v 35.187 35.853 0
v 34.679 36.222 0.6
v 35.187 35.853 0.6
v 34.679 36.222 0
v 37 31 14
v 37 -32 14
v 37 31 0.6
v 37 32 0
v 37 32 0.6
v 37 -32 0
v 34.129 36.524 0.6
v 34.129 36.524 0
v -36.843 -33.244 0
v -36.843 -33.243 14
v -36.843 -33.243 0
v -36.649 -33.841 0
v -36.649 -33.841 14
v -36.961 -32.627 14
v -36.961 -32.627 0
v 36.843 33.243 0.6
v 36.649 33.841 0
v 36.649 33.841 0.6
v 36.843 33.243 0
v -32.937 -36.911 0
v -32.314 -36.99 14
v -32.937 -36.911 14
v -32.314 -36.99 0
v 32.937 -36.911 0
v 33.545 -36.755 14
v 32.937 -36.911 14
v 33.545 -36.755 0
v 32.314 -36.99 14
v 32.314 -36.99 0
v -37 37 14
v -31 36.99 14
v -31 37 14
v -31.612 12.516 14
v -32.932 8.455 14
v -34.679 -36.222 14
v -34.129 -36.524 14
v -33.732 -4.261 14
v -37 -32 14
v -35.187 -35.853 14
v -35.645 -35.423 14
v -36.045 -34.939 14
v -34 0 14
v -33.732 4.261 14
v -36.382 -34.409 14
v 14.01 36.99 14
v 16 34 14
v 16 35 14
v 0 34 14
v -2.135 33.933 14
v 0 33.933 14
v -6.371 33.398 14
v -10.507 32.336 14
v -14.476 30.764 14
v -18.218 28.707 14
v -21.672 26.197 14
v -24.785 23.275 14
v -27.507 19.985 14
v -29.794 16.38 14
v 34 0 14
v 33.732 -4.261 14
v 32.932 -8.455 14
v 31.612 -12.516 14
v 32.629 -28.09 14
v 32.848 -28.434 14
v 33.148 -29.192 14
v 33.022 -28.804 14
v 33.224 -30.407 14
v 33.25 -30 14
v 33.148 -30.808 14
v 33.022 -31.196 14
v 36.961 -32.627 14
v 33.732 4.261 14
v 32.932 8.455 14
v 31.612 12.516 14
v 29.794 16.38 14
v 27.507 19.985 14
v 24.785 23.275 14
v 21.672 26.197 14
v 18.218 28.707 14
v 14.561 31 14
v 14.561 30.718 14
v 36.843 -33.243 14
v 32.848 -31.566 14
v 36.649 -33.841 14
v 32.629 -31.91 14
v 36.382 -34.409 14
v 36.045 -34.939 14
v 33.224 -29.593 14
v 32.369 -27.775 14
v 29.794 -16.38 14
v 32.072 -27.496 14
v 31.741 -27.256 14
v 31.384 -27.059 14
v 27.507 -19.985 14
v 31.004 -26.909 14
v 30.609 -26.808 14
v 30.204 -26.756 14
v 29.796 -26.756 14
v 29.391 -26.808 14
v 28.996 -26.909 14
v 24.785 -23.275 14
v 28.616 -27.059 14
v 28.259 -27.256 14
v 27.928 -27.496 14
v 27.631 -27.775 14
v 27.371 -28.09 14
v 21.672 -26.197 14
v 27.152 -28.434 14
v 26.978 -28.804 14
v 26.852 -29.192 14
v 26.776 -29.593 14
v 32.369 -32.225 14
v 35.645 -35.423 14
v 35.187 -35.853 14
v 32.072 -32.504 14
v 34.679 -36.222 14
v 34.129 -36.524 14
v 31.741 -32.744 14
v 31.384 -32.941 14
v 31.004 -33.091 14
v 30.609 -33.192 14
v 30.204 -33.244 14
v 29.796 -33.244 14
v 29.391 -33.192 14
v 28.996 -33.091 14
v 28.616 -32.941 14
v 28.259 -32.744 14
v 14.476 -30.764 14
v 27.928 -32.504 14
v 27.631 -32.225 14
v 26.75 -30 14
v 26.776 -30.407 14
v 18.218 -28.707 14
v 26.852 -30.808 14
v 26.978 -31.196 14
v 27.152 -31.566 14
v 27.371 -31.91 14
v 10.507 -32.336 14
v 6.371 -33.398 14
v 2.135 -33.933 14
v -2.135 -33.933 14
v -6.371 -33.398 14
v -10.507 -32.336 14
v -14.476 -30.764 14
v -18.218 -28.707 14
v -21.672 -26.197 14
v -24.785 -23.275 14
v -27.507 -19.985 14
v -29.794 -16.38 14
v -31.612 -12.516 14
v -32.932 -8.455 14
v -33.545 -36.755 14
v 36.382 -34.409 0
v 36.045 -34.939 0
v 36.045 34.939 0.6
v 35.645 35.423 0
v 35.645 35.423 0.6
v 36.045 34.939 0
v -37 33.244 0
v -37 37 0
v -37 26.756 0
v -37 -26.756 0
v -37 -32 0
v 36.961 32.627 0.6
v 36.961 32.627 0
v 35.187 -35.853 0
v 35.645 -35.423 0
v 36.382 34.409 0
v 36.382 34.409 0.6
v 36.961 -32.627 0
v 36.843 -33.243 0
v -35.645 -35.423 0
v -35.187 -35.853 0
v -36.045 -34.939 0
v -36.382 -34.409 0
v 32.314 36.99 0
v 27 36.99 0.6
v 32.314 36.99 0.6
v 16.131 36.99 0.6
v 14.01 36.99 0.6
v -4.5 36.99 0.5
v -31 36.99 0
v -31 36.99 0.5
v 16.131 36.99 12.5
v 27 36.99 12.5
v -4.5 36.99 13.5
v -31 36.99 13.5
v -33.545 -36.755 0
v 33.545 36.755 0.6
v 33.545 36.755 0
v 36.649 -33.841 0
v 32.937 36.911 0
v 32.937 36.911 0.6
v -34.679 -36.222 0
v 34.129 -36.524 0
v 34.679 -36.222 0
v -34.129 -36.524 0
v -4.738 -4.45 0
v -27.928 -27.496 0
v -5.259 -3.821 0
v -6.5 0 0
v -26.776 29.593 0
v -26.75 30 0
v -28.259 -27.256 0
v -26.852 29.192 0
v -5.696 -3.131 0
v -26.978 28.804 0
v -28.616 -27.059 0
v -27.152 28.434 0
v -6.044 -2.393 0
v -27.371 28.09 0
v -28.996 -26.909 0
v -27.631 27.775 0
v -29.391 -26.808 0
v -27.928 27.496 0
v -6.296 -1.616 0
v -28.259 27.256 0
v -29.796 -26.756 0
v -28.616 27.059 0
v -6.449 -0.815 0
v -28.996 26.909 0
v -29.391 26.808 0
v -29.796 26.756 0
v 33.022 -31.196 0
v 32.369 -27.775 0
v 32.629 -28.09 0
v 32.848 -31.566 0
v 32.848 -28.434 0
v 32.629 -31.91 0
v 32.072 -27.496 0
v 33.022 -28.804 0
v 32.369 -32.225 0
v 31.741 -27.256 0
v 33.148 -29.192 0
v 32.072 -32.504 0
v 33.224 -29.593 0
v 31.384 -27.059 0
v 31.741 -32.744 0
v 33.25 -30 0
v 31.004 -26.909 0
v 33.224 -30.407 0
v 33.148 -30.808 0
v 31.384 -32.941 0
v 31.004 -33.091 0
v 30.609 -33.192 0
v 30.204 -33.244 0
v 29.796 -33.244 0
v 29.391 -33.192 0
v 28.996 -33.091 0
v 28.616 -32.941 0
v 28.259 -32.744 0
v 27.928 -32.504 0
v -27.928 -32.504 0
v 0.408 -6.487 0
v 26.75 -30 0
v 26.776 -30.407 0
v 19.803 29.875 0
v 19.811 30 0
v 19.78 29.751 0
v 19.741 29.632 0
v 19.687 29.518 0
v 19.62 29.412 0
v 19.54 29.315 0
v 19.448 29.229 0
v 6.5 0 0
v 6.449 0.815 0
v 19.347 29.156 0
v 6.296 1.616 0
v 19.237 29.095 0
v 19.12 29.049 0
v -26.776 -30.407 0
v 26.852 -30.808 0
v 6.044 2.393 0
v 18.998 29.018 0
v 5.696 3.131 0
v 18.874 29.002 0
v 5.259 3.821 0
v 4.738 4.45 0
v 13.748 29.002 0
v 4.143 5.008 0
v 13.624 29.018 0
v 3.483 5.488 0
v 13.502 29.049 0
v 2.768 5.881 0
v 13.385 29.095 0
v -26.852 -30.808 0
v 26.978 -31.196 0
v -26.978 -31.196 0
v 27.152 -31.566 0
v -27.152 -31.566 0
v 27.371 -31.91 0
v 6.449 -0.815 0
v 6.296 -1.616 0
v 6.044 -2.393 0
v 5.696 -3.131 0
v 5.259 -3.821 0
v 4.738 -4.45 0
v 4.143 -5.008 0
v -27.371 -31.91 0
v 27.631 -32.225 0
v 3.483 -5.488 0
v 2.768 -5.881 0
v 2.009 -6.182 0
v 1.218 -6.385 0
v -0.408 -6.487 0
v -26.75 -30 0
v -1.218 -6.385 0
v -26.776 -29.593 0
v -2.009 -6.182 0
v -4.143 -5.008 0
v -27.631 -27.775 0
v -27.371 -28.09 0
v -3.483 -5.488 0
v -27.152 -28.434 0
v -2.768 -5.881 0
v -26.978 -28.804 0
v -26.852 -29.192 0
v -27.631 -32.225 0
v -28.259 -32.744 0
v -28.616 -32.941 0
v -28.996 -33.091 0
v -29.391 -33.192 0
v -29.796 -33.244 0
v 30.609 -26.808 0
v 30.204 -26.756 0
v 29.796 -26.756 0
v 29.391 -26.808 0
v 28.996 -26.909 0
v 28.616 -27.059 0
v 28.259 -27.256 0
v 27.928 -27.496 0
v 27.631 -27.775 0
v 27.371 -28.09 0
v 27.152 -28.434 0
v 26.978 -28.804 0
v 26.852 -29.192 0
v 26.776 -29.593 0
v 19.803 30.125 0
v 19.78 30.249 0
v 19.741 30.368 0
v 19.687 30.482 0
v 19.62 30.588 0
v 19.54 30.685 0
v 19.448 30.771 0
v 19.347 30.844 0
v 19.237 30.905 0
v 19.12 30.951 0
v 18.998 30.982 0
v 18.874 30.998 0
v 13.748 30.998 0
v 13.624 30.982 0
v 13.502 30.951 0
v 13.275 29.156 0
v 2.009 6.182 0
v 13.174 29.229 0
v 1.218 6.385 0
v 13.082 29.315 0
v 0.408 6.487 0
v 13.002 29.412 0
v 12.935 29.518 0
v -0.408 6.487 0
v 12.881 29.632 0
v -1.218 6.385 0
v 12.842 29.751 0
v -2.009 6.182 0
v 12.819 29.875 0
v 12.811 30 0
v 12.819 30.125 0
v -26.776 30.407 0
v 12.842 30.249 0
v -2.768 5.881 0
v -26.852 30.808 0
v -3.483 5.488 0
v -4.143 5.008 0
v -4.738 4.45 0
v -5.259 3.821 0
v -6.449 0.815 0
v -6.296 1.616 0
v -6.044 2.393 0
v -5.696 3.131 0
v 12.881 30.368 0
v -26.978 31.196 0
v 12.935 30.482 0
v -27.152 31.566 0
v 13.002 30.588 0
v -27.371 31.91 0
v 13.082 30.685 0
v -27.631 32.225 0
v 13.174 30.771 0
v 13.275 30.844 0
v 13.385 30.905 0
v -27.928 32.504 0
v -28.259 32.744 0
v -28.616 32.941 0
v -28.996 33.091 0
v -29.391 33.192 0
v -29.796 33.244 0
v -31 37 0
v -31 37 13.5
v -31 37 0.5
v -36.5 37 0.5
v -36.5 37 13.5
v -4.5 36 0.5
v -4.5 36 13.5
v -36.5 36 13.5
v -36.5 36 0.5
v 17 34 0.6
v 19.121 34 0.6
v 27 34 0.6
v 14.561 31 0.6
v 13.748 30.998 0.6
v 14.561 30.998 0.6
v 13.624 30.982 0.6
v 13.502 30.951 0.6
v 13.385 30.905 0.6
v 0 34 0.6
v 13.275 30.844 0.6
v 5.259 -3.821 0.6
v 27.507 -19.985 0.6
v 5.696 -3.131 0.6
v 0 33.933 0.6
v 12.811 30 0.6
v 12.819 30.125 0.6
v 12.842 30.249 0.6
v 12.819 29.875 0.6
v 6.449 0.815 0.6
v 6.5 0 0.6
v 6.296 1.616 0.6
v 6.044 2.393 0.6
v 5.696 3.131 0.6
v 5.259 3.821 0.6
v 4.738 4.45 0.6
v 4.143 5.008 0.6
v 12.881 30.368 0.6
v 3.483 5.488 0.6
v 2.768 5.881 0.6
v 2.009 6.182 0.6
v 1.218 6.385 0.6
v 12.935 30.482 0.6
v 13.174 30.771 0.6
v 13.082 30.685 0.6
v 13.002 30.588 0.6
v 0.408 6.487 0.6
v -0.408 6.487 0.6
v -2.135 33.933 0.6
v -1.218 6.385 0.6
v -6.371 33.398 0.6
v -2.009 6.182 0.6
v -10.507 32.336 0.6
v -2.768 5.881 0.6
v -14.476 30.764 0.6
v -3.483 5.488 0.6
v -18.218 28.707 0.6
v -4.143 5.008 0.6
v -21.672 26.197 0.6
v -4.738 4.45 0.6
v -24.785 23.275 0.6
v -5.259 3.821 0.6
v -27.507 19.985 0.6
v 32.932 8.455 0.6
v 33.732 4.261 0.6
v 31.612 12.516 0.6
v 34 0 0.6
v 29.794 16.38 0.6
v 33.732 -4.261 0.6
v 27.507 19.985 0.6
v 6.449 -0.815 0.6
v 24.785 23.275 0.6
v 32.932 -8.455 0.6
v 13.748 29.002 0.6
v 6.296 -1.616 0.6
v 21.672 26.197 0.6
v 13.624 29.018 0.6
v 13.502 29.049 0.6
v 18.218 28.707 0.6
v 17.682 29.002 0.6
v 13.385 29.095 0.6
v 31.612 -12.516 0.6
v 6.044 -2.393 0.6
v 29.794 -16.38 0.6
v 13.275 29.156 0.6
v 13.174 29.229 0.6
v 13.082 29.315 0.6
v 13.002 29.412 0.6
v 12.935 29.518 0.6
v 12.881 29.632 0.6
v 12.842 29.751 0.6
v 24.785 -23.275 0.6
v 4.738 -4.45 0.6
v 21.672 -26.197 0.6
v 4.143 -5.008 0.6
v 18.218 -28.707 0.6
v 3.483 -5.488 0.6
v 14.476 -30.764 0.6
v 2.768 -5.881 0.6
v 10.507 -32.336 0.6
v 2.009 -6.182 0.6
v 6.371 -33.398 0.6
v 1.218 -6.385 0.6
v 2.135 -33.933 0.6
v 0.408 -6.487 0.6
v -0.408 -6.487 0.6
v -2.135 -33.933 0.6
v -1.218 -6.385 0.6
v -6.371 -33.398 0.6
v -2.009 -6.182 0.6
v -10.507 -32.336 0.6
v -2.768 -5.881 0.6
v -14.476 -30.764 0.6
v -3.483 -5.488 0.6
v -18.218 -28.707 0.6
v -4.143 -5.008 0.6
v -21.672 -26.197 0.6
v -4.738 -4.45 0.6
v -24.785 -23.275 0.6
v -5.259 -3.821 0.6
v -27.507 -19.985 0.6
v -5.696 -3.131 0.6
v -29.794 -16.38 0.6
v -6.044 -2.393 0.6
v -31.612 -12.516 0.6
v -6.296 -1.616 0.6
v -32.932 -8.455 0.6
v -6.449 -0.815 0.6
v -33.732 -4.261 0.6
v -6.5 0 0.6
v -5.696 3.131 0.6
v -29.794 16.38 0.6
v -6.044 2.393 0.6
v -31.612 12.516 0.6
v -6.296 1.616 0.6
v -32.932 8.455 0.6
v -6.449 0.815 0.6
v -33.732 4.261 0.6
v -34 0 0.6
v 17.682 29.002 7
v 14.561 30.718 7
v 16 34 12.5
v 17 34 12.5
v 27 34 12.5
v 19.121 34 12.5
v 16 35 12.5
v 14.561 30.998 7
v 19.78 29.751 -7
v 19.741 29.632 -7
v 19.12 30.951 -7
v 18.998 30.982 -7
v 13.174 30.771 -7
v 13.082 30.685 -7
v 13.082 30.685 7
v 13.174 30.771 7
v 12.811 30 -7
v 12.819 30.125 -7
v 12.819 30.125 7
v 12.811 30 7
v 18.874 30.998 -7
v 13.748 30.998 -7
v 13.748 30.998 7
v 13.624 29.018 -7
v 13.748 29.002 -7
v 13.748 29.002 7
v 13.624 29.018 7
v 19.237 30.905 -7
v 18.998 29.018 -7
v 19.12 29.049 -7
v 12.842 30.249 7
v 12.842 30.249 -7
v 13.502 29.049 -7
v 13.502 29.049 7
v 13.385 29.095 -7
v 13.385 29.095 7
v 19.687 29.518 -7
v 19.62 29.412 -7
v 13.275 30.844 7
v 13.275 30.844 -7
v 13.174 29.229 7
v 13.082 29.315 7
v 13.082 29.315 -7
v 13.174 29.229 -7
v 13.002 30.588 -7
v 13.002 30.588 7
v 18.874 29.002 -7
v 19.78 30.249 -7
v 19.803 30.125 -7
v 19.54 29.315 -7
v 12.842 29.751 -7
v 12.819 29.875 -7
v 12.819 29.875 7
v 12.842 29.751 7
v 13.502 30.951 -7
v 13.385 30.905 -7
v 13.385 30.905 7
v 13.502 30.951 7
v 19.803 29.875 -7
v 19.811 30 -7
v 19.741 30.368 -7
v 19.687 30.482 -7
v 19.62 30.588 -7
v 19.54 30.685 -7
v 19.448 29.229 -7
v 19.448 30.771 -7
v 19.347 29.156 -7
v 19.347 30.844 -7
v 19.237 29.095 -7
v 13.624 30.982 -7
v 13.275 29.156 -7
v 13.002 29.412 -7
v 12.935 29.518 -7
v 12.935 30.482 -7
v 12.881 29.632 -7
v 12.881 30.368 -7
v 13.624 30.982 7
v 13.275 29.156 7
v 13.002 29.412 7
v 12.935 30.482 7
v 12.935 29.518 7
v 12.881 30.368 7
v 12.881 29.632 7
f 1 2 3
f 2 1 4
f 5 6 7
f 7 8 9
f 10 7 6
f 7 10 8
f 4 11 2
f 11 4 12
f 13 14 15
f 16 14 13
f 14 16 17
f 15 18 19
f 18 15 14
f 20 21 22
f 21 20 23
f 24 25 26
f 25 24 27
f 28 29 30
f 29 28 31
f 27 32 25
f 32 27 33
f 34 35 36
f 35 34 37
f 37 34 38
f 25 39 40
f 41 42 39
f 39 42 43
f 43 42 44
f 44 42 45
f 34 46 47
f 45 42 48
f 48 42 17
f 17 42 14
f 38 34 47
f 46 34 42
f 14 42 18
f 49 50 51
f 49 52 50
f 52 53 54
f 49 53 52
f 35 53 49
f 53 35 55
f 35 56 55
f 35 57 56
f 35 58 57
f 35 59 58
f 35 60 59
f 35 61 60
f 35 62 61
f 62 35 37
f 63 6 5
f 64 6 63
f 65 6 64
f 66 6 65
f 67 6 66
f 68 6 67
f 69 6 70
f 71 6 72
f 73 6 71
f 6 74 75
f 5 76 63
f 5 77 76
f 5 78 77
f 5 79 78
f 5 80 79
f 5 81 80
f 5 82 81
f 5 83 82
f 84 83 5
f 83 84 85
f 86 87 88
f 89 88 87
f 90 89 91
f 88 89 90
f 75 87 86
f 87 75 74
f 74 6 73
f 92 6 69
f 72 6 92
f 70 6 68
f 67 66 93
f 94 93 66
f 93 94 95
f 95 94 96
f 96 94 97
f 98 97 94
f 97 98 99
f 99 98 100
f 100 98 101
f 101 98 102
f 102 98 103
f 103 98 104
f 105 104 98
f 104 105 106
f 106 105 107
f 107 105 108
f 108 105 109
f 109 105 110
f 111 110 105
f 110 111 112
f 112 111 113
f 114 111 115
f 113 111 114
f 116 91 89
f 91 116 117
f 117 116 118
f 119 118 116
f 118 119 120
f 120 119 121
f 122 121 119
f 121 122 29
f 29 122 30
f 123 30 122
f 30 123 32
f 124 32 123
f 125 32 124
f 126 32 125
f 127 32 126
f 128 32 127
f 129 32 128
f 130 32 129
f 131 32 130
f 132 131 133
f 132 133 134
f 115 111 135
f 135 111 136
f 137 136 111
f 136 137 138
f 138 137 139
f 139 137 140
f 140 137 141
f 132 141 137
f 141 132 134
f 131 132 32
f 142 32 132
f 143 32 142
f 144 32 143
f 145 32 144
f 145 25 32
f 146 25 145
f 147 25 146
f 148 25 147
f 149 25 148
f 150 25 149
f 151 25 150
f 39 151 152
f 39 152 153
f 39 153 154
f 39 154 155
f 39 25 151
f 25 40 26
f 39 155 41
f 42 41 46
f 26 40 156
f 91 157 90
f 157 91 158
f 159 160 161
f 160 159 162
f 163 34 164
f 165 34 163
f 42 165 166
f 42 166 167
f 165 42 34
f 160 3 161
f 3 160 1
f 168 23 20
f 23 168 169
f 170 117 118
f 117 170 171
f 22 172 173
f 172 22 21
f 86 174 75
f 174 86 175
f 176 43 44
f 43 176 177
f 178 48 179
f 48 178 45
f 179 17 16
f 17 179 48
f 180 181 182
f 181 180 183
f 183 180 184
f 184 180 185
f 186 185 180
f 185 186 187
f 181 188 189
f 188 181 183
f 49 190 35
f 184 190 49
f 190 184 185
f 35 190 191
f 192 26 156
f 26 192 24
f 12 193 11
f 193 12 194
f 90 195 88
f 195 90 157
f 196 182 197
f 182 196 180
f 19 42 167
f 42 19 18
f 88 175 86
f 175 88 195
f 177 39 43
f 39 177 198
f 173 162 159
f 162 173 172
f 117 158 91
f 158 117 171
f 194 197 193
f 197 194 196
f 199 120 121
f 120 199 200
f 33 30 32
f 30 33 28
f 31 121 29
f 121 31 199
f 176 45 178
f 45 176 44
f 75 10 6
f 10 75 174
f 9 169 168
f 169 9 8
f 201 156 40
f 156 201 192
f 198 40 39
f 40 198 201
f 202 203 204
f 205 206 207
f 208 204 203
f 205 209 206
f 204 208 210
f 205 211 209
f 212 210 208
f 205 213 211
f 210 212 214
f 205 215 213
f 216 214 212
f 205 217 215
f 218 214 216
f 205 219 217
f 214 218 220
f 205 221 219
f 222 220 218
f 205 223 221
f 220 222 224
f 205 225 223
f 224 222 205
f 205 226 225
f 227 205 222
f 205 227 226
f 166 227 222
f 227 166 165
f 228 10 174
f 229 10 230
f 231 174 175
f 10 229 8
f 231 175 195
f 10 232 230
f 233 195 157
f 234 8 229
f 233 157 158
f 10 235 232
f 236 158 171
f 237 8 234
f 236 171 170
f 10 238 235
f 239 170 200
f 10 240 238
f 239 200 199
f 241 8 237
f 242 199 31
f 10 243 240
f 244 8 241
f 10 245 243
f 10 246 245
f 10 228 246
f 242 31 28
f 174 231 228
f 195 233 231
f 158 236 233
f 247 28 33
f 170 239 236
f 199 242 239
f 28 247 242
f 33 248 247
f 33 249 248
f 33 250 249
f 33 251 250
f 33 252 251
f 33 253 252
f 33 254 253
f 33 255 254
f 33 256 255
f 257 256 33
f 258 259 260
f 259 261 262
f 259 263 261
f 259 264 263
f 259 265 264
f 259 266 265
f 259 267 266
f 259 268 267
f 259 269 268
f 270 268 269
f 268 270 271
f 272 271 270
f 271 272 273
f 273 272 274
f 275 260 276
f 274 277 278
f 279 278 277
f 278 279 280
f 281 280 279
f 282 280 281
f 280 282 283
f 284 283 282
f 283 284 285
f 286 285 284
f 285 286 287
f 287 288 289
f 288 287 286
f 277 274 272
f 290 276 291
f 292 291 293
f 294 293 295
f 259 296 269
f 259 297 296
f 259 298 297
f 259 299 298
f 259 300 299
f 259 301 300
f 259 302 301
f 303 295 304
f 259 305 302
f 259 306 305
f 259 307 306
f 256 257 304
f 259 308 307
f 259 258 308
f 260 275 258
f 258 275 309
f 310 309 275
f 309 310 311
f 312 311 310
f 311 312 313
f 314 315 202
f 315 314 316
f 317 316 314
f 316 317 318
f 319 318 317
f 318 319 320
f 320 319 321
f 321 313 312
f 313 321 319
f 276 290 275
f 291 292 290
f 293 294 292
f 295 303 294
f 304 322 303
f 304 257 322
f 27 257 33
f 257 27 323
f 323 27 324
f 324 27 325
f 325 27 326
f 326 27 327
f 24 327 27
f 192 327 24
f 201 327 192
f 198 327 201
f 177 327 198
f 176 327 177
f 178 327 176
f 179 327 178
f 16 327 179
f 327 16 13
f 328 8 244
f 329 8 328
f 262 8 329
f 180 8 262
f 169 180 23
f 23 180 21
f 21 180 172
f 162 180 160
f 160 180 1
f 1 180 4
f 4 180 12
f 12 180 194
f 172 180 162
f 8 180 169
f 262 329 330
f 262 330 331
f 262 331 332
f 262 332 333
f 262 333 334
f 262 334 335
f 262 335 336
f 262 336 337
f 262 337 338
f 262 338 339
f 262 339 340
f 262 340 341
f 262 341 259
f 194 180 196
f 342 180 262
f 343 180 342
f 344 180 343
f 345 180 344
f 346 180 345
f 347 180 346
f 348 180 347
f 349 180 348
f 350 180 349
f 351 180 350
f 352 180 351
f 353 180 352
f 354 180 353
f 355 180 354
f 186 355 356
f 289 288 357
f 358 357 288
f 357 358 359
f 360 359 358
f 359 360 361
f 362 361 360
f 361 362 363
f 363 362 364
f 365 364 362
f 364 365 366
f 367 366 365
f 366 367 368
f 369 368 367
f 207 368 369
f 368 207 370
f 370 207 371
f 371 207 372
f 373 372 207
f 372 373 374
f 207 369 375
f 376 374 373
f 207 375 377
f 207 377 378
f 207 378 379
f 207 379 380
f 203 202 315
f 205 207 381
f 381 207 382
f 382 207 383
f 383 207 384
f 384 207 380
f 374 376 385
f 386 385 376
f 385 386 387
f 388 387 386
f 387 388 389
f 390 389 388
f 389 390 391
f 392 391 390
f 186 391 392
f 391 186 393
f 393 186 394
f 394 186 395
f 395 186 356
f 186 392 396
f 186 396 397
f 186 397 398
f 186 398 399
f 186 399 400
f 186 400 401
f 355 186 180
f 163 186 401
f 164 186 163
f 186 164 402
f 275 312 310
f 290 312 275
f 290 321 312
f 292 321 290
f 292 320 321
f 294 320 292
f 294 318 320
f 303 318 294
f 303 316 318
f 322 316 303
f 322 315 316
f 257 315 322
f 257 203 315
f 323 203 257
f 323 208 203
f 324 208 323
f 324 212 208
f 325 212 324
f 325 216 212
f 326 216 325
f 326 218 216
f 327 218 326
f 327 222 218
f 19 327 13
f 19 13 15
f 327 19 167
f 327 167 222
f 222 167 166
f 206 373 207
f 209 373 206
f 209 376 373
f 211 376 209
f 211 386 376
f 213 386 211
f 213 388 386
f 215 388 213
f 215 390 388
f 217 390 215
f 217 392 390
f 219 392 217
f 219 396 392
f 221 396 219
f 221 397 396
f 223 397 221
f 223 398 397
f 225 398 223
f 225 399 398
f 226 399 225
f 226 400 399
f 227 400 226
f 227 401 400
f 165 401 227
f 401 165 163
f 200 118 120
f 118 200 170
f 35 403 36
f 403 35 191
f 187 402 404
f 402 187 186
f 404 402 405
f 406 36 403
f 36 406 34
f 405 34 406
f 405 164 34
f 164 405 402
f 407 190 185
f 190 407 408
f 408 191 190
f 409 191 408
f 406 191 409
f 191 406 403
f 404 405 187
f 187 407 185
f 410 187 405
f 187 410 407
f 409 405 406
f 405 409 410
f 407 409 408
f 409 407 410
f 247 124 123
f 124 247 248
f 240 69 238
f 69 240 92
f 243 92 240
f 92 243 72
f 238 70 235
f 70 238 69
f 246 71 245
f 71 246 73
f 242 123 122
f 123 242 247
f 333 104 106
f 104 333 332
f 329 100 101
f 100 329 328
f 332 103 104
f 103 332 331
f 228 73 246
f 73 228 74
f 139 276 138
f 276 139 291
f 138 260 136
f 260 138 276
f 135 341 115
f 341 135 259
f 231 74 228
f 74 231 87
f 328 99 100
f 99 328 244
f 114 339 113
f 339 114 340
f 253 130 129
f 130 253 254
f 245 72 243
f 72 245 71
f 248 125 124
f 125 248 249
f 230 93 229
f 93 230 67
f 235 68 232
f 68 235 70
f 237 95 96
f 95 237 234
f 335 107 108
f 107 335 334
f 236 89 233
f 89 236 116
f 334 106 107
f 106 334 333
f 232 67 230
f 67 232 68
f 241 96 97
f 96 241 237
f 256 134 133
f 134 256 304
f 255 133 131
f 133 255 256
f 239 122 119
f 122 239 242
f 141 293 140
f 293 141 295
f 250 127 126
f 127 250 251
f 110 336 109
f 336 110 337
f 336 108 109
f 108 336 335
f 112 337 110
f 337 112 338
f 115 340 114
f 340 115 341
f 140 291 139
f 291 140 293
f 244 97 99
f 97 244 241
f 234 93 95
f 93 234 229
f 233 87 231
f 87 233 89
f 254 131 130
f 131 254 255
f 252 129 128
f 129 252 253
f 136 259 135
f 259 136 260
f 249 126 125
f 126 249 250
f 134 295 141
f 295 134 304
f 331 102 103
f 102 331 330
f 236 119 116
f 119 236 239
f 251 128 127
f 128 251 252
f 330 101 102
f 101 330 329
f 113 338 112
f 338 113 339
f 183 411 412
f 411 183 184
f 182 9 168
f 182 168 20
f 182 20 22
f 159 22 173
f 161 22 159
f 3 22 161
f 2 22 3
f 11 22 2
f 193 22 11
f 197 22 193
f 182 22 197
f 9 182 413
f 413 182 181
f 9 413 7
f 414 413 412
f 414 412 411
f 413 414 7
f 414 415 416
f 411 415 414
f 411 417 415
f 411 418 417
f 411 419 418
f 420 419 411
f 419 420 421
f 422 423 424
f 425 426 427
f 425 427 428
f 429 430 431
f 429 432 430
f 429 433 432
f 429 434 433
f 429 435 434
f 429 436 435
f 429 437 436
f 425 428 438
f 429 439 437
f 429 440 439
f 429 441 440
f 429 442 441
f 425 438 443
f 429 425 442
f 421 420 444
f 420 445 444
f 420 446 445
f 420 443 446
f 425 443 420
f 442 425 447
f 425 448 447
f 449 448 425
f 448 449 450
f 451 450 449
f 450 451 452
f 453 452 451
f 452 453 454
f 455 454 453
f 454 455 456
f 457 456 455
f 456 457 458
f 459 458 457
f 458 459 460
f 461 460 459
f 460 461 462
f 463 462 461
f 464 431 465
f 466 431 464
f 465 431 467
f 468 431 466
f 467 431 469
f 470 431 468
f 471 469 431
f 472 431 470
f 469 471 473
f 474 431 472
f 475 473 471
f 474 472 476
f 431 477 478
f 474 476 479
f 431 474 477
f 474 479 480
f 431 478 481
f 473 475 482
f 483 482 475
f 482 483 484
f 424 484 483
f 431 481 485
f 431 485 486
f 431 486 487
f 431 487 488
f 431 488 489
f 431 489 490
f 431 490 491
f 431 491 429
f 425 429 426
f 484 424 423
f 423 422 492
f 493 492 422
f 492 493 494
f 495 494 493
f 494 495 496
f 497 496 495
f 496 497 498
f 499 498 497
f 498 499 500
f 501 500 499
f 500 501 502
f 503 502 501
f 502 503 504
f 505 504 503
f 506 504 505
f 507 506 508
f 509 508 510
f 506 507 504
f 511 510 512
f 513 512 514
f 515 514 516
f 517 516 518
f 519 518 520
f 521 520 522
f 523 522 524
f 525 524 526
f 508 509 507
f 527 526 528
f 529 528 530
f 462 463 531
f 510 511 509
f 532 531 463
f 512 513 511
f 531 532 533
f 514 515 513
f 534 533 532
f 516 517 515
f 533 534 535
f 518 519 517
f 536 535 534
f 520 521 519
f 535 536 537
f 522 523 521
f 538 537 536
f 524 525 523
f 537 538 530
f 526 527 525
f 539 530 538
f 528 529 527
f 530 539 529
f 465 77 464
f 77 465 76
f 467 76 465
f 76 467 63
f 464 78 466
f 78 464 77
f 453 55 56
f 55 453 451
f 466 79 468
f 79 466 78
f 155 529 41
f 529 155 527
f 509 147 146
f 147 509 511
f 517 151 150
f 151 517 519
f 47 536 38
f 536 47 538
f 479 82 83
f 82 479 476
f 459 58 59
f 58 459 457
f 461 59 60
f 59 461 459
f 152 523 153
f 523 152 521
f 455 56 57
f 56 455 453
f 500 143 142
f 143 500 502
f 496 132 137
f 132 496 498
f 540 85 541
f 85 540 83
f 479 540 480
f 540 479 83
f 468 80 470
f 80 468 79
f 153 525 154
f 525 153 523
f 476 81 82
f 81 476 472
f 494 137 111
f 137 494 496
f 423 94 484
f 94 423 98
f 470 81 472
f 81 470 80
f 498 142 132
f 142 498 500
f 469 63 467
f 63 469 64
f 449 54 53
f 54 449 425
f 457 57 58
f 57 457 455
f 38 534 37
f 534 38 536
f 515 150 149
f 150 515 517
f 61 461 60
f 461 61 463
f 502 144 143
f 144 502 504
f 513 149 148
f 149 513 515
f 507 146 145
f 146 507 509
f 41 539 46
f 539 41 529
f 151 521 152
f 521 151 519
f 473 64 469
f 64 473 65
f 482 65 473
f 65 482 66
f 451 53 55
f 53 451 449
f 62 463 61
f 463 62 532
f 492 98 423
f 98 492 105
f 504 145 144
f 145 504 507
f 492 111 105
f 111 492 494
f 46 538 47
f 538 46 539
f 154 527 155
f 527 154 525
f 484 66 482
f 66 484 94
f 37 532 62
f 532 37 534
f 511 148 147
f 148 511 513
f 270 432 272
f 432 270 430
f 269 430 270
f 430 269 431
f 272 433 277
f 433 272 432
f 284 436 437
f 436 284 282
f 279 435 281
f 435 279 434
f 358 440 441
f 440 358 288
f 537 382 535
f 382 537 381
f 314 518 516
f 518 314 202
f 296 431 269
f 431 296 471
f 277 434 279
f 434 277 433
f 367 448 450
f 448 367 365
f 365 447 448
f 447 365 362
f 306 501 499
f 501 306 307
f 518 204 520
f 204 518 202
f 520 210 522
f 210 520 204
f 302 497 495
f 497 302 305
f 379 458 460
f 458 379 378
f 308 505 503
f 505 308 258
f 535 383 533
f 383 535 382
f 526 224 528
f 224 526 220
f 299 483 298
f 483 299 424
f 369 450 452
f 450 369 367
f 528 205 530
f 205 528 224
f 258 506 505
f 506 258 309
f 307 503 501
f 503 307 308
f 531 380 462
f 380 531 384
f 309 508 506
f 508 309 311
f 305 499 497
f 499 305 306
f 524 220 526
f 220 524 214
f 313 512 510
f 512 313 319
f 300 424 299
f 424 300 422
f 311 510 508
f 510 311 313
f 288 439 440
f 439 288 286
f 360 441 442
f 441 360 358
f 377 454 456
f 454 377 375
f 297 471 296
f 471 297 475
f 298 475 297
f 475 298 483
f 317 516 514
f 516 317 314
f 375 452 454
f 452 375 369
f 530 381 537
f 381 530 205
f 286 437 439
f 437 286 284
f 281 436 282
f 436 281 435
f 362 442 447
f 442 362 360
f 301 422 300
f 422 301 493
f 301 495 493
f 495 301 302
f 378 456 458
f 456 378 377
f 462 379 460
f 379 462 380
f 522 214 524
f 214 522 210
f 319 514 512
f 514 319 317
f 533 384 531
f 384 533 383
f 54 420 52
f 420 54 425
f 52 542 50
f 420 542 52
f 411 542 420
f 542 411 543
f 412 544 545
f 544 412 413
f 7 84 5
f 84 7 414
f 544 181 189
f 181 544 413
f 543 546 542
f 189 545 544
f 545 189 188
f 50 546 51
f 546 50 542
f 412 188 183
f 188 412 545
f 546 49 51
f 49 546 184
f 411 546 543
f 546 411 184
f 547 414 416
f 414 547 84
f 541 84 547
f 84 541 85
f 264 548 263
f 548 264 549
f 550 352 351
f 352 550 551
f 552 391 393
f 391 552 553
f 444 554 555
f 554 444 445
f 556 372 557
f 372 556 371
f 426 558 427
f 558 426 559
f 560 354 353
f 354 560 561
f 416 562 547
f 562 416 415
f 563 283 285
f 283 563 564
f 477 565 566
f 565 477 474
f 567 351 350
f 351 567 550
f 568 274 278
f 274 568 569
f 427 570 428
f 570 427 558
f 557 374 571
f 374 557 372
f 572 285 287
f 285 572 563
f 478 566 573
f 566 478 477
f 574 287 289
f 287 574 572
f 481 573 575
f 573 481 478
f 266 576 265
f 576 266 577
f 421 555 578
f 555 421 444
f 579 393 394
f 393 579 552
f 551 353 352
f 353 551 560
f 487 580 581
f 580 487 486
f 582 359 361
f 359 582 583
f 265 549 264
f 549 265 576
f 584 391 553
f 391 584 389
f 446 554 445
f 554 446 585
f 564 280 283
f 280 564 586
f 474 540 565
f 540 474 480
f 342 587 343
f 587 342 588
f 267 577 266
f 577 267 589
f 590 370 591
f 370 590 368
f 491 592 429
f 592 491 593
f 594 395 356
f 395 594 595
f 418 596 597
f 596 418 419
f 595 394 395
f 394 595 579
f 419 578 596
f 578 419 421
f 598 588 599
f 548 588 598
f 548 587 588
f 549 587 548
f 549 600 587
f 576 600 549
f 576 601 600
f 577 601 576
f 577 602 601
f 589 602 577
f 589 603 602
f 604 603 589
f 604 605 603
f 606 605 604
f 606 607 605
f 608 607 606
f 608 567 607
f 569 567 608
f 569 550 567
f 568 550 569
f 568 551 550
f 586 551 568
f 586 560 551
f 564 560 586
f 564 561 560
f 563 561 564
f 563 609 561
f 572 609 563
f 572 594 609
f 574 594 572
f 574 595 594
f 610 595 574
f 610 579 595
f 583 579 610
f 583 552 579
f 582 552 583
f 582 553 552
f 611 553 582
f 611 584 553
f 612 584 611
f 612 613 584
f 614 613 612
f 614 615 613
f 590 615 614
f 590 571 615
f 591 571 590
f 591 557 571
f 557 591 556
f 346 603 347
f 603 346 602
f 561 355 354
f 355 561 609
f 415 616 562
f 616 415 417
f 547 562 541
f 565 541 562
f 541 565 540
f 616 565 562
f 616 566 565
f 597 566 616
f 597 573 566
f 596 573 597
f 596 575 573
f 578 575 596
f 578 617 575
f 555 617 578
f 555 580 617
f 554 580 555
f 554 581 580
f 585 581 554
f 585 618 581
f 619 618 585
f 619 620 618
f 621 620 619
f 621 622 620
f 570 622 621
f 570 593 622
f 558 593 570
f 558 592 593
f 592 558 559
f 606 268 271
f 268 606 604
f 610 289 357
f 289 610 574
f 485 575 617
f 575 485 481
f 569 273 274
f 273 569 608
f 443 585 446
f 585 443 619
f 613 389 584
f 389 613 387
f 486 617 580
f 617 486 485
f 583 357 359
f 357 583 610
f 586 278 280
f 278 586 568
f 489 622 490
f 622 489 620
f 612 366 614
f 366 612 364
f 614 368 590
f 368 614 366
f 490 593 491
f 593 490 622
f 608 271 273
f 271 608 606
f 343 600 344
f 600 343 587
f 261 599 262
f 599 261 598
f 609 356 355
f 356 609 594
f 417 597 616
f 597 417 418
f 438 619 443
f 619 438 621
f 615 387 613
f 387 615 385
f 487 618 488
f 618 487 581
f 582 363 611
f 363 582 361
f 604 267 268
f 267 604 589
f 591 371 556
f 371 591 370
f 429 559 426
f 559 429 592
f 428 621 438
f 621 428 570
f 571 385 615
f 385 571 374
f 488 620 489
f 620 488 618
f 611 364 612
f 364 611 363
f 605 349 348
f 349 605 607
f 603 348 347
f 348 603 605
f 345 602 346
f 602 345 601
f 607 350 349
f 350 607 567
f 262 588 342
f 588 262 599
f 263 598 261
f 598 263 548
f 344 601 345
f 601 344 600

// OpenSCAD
$fn = 50;


union() {
	difference() {
		union() {
			hull() {
				translate(v = [-32.0000000000, 32.0000000000, 0]) {
					cylinder(h = 14, r = 5);
				}
				translate(v = [32.0000000000, 32.0000000000, 0]) {
					cylinder(h = 14, r = 5);
				}
				translate(v = [-32.0000000000, -32.0000000000, 0]) {
					cylinder(h = 14, r = 5);
				}
				translate(v = [32.0000000000, -32.0000000000, 0]) {
					cylinder(h = 14, r = 5);
				}
			}
			translate(v = [-37.0000000000, 31.0000000000, 0]) {
				cube(size = [6, 6, 14]);
			}
		}
		union() {
			translate(v = [-37.5000000000, -30.0000000000, -250.0000000000]) {
				rotate(a = [0, 0, 0]) {
					difference() {
						union() {
							hull() {
								translate(v = [7.5000000000, 0, 0]) {
									cylinder(h = 250, r = 3.2500000000, r1 = 3.2500000000, r2 = 3.2500000000);
								}
								translate(v = [-7.5000000000, 0, 0]) {
									cylinder(h = 250, r = 3.2500000000, r1 = 3.2500000000, r2 = 3.2500000000);
								}
							}
						}
						union();
					}
				}
			}
			translate(v = [-37.5000000000, 30.0000000000, -250.0000000000]) {
				rotate(a = [0, 0, 0]) {
					difference() {
						union() {
							hull() {
								translate(v = [7.5000000000, 0, 0]) {
									cylinder(h = 250, r = 3.2500000000, r1 = 3.2500000000, r2 = 3.2500000000);
								}
								translate(v = [-7.5000000000, 0, 0]) {
									cylinder(h = 250, r = 3.2500000000, r1 = 3.2500000000, r2 = 3.2500000000);
								}
							}
						}
						union();
					}
				}
			}
			translate(v = [-36.5000000000, 36.0000000000, 0.5000000000]) {
				cube(size = [32, 1, 13.0000000000]);
			}
			translate(v = [30.0000000000, -30.0000000000, 0]) {
				cylinder(h = 100, r = 3.2500000000);
			}
			translate(v = [0, 0, 0.6000000000]) {
				cylinder(h = 16.4000000000, r = 34.0000000000);
			}
			translate(v = [0, 0, -7.0000000000]) {
				cylinder(h = 14, r = 6.5000000000);
			}
			translate(v = [0.0000000000, 31.0000000000, 0.6000000000]) {
				cube(size = [37.0000000000, 3, 16.4000000000]);
			}
			translate(v = [27.0000000000, 31.0000000000, 0.6000000000]) {
				cube(size = [10, 6, 16.4000000000]);
			}
			translate(v = [16.0000000000, 31.0000000000, 12.5000000000]) {
				cube(size = [21, 6, 1.5000000000]);
			}
			translate(v = [13.2500000000, 37.7500000000, 0.6000000000]) {
				rotate(a = [0, 0, -45]) {
					cube(size = [7.5000000000, 1.5000000000, 16.4000000000]);
				}
			}
			translate(v = [7.0610000000, 29.0000000000, 0.6000000000]) {
				cube(size = [7.5000000000, 2, 13.4000000000]);
			}
		}
	}
	union() {
		translate(v = [16.3110000000, 30.0000000000, -7.0000000000]) {
			rotate(a = [0, 0, 0]) {
				difference() {
					union() {
						#hull() {
							#translate(v = [2.5000000000, 0, 0]) {
								cylinder(h = 14, r = 1.0000000000, r1 = 1.0000000000, r2 = 1.0000000000);
							}
							#translate(v = [-2.5000000000, 0, 0]) {
								cylinder(h = 14, r = 1.0000000000, r1 = 1.0000000000, r2 = 1.0000000000);
							}
						}
					}
					union();
				}
			}
		}
	}
}
